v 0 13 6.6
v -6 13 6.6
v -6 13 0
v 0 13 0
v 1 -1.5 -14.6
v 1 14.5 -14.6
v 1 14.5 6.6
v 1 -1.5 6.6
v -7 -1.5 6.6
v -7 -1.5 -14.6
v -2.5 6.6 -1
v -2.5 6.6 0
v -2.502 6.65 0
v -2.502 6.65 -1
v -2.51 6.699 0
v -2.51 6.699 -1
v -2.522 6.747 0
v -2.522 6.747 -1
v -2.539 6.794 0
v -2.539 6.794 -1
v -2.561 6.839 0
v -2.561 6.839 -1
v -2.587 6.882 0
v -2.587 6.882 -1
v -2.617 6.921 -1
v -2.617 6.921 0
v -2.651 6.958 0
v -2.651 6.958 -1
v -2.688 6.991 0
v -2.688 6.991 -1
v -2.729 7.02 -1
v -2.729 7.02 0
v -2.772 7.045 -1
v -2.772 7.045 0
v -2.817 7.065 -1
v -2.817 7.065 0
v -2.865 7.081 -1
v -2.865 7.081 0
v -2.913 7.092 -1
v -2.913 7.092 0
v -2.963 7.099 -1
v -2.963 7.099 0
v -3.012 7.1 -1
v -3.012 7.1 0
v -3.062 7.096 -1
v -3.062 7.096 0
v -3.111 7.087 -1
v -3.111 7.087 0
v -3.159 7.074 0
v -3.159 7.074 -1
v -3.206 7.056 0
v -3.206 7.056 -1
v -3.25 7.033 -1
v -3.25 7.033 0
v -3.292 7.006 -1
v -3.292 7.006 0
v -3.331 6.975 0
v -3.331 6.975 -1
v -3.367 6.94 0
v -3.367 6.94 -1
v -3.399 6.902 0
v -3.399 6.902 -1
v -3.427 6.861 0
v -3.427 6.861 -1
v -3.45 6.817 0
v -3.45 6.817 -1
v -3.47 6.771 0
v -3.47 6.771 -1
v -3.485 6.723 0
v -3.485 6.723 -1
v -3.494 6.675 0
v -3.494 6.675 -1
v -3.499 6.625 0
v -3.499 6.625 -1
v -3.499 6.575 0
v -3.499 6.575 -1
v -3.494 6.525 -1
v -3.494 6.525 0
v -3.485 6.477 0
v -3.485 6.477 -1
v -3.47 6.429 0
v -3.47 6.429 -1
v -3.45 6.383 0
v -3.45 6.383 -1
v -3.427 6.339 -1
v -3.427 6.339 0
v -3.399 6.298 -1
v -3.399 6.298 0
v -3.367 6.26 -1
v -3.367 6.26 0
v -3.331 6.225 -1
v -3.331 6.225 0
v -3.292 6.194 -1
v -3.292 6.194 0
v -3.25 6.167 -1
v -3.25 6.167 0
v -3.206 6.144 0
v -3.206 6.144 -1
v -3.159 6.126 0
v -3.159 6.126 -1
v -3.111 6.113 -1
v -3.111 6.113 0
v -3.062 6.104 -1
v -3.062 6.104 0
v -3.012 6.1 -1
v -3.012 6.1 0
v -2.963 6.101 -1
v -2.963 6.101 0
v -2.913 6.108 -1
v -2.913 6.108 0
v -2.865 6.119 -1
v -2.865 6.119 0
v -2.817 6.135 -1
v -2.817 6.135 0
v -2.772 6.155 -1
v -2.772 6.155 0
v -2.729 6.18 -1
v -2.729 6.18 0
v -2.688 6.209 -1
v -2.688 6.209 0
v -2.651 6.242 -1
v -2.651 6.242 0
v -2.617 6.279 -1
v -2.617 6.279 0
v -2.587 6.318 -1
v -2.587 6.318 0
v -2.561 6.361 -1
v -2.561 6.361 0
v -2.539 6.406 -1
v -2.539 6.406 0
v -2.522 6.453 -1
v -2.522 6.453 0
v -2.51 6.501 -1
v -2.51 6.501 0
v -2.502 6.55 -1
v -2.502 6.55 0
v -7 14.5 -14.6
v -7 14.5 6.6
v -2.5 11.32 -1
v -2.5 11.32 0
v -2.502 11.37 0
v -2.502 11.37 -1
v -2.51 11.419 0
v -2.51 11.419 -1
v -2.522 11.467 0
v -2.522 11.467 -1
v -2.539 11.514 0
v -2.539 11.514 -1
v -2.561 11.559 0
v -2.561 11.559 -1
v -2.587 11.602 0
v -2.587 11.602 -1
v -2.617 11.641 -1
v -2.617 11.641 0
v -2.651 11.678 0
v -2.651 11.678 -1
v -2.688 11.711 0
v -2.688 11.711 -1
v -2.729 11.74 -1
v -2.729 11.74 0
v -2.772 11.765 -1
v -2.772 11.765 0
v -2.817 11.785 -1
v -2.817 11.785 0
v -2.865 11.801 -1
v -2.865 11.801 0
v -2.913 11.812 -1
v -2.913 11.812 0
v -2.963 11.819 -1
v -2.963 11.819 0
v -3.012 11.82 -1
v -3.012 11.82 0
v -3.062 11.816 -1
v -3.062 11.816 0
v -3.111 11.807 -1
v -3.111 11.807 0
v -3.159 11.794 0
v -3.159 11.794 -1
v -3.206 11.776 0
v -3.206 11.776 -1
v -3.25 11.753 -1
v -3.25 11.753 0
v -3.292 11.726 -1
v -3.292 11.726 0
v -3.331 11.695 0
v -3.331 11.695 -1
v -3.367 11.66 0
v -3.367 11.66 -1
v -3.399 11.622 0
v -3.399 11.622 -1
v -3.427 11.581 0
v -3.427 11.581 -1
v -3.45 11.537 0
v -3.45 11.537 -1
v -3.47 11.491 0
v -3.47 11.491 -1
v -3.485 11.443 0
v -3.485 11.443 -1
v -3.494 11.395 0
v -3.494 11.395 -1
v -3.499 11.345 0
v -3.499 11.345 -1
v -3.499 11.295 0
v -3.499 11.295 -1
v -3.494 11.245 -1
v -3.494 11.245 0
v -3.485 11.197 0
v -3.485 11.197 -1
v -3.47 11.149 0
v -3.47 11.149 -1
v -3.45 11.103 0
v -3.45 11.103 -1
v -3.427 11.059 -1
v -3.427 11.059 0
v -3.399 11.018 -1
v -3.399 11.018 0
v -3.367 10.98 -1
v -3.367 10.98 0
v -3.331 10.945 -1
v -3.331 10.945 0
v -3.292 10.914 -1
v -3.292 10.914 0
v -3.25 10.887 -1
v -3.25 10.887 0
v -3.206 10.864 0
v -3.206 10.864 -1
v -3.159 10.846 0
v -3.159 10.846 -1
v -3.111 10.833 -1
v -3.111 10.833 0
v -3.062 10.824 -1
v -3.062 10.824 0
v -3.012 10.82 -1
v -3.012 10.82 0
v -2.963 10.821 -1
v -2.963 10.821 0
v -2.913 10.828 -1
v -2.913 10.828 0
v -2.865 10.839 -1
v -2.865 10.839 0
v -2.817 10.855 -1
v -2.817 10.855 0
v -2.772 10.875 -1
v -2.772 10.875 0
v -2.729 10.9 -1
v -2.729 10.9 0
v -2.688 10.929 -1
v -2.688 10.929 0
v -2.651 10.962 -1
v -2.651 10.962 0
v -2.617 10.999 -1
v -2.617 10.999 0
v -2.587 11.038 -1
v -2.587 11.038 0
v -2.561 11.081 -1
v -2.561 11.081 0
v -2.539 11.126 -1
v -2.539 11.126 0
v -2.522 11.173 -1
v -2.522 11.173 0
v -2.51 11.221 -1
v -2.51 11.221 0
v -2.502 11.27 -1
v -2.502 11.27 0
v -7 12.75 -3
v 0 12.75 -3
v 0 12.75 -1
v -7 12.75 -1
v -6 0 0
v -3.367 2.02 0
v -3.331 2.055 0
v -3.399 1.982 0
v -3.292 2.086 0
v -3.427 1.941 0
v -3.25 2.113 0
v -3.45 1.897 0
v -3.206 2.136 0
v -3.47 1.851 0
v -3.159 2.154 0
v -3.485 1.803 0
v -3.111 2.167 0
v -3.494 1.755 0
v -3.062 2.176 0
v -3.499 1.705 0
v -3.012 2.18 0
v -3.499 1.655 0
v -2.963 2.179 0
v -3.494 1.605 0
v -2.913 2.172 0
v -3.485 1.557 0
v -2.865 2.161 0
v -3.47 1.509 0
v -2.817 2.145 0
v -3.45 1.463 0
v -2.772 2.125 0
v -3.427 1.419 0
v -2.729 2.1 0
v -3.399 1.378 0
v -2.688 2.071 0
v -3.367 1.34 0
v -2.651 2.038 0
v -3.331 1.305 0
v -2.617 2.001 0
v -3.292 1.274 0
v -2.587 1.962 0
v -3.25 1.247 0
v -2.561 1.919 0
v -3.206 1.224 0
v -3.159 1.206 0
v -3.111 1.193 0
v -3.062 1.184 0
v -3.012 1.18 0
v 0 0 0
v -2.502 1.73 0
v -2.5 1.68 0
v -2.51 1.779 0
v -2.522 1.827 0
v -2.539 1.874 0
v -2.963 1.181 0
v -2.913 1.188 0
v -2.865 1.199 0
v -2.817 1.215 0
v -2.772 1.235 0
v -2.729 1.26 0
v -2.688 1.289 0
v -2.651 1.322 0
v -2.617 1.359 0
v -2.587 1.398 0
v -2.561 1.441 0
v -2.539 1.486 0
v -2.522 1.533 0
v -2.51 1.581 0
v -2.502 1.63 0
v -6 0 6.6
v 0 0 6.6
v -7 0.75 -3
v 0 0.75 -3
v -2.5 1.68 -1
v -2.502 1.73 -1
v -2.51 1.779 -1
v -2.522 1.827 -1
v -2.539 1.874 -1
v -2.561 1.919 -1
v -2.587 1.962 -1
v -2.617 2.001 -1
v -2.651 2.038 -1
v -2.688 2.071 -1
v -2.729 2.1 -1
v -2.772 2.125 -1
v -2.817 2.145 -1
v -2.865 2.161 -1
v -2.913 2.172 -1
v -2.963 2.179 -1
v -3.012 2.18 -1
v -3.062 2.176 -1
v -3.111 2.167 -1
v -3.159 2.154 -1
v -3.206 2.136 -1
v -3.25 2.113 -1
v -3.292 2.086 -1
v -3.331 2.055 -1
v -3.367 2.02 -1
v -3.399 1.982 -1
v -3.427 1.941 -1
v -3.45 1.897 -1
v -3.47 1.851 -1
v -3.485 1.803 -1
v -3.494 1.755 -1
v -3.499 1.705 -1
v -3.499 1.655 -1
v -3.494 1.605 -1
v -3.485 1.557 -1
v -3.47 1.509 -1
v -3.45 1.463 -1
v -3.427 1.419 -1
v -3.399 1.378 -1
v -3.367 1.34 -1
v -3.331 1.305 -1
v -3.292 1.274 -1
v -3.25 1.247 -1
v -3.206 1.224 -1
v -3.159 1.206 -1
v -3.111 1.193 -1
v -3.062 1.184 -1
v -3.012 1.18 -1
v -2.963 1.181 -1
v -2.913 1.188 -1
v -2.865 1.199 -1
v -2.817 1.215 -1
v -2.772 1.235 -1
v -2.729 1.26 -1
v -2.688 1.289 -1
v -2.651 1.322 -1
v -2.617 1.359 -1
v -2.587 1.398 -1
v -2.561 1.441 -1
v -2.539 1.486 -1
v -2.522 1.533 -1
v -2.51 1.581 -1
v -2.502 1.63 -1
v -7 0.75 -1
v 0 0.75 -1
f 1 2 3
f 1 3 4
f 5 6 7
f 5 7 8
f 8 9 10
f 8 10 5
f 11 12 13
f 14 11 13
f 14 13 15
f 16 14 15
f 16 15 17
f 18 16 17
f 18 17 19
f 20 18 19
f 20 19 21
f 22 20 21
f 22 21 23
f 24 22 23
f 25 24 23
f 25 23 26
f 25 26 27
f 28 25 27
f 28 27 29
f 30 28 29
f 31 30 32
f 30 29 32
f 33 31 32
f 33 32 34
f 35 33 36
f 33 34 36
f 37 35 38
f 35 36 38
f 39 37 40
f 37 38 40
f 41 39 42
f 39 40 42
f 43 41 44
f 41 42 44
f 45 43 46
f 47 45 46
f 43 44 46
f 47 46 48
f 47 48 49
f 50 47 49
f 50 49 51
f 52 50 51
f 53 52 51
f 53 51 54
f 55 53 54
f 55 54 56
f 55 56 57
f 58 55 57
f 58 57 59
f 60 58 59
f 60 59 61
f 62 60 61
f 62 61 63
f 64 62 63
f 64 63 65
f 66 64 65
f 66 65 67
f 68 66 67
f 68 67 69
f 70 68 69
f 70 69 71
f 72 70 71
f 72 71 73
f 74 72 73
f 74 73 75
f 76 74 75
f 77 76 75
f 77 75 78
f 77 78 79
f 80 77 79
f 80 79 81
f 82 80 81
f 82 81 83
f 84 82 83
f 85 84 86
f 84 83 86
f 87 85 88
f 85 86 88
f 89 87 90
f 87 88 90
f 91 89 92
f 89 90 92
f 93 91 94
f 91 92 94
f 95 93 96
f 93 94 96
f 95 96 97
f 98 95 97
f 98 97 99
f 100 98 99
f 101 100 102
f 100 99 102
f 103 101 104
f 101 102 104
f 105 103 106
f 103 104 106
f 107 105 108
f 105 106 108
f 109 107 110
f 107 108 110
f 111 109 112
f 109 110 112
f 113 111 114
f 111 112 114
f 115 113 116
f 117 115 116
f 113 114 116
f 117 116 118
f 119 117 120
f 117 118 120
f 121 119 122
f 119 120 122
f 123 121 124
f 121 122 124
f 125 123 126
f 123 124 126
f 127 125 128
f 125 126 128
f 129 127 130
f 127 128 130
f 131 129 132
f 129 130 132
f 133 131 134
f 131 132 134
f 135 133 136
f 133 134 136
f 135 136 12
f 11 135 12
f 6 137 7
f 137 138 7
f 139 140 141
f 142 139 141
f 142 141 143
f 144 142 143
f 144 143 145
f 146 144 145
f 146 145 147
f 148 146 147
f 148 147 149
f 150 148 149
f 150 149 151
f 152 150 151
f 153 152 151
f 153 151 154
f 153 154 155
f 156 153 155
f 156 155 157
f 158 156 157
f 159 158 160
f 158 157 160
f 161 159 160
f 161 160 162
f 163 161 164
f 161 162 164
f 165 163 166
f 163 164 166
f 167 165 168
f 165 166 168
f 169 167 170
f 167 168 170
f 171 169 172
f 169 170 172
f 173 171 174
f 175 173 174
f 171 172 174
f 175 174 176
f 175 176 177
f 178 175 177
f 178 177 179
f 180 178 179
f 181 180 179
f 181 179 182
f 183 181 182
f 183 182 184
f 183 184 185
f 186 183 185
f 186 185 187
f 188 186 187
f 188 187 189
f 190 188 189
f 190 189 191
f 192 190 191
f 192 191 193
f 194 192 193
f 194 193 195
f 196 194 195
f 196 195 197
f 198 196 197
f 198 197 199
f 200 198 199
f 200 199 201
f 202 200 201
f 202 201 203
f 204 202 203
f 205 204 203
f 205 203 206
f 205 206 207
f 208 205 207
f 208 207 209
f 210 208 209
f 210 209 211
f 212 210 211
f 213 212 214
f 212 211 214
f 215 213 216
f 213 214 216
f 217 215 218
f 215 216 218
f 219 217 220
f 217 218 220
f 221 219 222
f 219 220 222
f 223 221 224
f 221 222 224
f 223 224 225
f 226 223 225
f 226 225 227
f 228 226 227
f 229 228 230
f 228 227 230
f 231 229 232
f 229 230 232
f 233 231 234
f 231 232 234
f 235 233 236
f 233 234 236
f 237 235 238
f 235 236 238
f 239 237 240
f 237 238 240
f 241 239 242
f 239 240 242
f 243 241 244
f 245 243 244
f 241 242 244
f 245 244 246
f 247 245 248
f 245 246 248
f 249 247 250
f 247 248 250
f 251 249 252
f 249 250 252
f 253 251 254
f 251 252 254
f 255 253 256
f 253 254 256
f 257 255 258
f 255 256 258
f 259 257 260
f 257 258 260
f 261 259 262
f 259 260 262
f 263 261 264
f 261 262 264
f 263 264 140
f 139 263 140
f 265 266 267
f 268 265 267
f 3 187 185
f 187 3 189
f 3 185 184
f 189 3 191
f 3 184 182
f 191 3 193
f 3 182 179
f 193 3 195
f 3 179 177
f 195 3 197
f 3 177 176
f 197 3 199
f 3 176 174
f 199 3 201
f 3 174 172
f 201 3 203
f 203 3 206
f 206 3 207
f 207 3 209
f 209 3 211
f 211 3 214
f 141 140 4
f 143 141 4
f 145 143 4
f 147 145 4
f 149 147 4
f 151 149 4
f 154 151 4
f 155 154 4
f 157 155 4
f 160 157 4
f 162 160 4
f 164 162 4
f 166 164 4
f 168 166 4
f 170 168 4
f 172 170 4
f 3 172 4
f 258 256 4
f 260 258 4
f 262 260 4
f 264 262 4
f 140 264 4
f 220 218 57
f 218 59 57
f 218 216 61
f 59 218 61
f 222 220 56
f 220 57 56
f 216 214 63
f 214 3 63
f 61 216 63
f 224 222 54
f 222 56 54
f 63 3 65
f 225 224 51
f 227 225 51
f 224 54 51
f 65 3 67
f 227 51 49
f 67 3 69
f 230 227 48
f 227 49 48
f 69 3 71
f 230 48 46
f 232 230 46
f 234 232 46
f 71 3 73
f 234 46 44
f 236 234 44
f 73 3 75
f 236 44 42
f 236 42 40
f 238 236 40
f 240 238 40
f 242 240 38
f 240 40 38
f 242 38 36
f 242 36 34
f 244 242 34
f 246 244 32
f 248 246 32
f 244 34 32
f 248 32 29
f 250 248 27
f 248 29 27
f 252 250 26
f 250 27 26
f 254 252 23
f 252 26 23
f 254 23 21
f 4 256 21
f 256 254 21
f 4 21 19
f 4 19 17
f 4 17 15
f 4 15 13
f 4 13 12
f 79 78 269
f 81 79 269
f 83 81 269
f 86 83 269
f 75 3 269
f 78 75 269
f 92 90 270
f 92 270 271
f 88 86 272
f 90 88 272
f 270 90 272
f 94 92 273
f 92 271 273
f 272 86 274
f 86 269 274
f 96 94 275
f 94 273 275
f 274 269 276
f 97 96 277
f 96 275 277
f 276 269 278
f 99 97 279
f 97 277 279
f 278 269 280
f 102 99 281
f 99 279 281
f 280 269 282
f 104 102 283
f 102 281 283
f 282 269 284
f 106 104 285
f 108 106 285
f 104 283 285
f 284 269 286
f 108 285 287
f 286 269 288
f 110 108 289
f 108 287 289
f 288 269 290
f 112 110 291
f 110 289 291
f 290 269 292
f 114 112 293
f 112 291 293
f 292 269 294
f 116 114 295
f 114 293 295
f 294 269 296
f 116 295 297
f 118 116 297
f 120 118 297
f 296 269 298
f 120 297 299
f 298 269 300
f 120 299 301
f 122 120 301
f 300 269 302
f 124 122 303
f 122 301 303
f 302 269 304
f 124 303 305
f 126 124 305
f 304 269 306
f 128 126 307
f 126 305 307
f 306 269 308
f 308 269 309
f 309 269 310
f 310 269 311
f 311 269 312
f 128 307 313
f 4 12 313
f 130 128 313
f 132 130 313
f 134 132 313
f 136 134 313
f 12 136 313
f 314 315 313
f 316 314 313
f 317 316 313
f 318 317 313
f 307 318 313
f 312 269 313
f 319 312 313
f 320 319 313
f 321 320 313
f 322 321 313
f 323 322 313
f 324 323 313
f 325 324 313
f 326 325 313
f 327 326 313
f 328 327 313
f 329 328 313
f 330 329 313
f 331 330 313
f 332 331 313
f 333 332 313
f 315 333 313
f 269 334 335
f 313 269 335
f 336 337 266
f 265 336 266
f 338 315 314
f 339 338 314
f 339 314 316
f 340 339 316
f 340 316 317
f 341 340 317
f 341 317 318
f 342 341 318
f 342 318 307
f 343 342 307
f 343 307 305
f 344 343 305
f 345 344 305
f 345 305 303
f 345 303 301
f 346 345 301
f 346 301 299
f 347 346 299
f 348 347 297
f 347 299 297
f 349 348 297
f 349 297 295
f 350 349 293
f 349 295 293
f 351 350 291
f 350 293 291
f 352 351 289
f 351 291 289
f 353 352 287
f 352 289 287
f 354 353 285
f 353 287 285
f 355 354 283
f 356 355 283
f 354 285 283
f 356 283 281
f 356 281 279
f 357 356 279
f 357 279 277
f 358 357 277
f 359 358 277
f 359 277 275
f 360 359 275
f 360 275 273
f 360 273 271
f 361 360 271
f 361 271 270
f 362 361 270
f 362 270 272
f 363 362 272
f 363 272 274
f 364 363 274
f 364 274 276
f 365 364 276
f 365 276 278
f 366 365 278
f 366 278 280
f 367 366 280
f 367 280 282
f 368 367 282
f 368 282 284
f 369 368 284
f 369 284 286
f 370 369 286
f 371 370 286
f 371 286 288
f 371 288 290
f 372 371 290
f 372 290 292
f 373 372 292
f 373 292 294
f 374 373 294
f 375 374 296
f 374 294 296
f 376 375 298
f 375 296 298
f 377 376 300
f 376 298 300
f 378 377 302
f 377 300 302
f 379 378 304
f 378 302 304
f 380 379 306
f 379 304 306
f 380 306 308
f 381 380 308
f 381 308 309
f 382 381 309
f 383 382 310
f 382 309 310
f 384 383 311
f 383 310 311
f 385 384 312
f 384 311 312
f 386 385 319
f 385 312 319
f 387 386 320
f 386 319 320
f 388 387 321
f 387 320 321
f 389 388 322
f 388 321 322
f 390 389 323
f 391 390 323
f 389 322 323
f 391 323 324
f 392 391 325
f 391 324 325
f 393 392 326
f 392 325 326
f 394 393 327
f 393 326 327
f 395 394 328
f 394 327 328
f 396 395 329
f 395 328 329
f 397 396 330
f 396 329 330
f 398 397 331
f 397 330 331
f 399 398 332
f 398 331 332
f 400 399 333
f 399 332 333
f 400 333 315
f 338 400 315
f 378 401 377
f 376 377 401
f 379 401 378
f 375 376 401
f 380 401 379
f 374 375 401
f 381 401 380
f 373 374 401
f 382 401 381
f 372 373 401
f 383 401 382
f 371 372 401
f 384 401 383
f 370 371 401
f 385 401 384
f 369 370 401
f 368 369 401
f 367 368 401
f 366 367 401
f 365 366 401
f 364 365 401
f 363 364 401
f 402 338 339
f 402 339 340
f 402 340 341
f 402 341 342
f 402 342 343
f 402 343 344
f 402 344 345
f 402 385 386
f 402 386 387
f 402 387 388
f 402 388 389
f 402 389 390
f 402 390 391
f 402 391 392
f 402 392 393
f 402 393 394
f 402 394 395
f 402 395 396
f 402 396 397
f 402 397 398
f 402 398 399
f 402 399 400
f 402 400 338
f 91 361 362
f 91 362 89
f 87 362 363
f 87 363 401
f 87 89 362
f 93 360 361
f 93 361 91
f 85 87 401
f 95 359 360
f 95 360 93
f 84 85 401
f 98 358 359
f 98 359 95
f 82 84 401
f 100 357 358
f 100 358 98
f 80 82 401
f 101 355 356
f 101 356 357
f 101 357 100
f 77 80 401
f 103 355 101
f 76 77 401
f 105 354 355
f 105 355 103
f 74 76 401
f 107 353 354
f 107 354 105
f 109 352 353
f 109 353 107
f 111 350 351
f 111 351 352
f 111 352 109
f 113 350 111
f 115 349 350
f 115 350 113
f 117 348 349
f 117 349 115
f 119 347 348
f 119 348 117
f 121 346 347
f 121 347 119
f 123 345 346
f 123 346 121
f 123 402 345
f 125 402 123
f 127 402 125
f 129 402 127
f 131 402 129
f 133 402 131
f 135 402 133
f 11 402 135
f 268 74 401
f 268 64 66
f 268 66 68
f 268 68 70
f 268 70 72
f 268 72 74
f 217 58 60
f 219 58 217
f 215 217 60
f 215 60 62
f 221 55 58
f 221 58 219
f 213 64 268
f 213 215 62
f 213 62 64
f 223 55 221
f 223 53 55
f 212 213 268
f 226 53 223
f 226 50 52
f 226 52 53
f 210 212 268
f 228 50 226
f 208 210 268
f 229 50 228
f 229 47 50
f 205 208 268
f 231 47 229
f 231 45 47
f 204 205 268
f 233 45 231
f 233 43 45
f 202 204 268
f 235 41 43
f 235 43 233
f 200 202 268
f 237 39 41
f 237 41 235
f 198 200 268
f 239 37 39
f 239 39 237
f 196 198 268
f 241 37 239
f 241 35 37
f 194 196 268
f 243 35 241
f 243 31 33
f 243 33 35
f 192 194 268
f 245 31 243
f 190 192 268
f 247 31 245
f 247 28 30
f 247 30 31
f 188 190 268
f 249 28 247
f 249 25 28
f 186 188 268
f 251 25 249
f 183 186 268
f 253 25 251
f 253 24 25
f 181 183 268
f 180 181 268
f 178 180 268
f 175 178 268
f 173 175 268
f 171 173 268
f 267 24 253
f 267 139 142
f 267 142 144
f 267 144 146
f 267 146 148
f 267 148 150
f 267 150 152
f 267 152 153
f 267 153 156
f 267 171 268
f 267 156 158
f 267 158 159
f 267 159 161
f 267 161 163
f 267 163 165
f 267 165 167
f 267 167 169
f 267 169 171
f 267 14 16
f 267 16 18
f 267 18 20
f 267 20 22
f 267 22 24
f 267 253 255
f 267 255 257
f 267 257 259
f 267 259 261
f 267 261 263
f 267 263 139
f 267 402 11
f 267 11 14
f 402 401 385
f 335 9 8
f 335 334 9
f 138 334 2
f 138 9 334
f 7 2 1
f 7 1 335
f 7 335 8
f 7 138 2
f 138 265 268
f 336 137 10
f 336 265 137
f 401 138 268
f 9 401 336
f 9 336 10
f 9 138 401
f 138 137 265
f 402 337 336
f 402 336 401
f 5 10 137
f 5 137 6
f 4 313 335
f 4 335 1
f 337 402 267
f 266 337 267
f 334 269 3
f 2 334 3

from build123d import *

# Parameters (mm, degrees)
F0_W     = 8
F0_H     = 16
F0_W_2   = 6
F0_H_2   = 13
F1_DEPTH = 6.6
F2_W     = 8
F2_H     = 16
F3_DEPTH = 14.6
F5_R     = 0.5
F6_DEPTH = 3
F4_W     = 12
F4_H     = 2
F7_DEPTH = 12


with BuildPart() as f1:
    # F0 (on Top) → F1 (new body)
    with BuildSketch(Plane.XY):
        with Locations((-3, 6.5)):
            Rectangle(F0_W, F0_H)
        with Locations((-3, 6.5)):
            Rectangle(F0_W_2, F0_H_2, mode=Mode.SUBTRACT)
    extrude(amount=F1_DEPTH)

    # F2 (on face) → F3 (join)
    with BuildSketch(Plane(origin=(0, 0, 0), x_dir=(1, 0, 0), z_dir=(0, 0, -1))):
        with Locations((-3, -6.5)):
            Rectangle(F2_W, F2_H)
    extrude(amount=F3_DEPTH)

    # F5 (on face) → F6 (cut)
    with BuildSketch(Plane.XY):
        with Locations((-3, 11.32)):
            Circle(F5_R)
        with Locations((-3, 6.6)):
            Circle(F5_R)
        with Locations((-3, 1.68)):
            Circle(F5_R)
    extrude(amount=-F6_DEPTH, mode=Mode.SUBTRACT)

    # F4 (on Right) → F7 (cut)
    with BuildSketch(Plane.YZ):
        with Locations((6.75, -2)):
            Rectangle(F4_W, F4_H)
    extrude(amount=-F7_DEPTH, mode=Mode.SUBTRACT)


solid = f1.part
